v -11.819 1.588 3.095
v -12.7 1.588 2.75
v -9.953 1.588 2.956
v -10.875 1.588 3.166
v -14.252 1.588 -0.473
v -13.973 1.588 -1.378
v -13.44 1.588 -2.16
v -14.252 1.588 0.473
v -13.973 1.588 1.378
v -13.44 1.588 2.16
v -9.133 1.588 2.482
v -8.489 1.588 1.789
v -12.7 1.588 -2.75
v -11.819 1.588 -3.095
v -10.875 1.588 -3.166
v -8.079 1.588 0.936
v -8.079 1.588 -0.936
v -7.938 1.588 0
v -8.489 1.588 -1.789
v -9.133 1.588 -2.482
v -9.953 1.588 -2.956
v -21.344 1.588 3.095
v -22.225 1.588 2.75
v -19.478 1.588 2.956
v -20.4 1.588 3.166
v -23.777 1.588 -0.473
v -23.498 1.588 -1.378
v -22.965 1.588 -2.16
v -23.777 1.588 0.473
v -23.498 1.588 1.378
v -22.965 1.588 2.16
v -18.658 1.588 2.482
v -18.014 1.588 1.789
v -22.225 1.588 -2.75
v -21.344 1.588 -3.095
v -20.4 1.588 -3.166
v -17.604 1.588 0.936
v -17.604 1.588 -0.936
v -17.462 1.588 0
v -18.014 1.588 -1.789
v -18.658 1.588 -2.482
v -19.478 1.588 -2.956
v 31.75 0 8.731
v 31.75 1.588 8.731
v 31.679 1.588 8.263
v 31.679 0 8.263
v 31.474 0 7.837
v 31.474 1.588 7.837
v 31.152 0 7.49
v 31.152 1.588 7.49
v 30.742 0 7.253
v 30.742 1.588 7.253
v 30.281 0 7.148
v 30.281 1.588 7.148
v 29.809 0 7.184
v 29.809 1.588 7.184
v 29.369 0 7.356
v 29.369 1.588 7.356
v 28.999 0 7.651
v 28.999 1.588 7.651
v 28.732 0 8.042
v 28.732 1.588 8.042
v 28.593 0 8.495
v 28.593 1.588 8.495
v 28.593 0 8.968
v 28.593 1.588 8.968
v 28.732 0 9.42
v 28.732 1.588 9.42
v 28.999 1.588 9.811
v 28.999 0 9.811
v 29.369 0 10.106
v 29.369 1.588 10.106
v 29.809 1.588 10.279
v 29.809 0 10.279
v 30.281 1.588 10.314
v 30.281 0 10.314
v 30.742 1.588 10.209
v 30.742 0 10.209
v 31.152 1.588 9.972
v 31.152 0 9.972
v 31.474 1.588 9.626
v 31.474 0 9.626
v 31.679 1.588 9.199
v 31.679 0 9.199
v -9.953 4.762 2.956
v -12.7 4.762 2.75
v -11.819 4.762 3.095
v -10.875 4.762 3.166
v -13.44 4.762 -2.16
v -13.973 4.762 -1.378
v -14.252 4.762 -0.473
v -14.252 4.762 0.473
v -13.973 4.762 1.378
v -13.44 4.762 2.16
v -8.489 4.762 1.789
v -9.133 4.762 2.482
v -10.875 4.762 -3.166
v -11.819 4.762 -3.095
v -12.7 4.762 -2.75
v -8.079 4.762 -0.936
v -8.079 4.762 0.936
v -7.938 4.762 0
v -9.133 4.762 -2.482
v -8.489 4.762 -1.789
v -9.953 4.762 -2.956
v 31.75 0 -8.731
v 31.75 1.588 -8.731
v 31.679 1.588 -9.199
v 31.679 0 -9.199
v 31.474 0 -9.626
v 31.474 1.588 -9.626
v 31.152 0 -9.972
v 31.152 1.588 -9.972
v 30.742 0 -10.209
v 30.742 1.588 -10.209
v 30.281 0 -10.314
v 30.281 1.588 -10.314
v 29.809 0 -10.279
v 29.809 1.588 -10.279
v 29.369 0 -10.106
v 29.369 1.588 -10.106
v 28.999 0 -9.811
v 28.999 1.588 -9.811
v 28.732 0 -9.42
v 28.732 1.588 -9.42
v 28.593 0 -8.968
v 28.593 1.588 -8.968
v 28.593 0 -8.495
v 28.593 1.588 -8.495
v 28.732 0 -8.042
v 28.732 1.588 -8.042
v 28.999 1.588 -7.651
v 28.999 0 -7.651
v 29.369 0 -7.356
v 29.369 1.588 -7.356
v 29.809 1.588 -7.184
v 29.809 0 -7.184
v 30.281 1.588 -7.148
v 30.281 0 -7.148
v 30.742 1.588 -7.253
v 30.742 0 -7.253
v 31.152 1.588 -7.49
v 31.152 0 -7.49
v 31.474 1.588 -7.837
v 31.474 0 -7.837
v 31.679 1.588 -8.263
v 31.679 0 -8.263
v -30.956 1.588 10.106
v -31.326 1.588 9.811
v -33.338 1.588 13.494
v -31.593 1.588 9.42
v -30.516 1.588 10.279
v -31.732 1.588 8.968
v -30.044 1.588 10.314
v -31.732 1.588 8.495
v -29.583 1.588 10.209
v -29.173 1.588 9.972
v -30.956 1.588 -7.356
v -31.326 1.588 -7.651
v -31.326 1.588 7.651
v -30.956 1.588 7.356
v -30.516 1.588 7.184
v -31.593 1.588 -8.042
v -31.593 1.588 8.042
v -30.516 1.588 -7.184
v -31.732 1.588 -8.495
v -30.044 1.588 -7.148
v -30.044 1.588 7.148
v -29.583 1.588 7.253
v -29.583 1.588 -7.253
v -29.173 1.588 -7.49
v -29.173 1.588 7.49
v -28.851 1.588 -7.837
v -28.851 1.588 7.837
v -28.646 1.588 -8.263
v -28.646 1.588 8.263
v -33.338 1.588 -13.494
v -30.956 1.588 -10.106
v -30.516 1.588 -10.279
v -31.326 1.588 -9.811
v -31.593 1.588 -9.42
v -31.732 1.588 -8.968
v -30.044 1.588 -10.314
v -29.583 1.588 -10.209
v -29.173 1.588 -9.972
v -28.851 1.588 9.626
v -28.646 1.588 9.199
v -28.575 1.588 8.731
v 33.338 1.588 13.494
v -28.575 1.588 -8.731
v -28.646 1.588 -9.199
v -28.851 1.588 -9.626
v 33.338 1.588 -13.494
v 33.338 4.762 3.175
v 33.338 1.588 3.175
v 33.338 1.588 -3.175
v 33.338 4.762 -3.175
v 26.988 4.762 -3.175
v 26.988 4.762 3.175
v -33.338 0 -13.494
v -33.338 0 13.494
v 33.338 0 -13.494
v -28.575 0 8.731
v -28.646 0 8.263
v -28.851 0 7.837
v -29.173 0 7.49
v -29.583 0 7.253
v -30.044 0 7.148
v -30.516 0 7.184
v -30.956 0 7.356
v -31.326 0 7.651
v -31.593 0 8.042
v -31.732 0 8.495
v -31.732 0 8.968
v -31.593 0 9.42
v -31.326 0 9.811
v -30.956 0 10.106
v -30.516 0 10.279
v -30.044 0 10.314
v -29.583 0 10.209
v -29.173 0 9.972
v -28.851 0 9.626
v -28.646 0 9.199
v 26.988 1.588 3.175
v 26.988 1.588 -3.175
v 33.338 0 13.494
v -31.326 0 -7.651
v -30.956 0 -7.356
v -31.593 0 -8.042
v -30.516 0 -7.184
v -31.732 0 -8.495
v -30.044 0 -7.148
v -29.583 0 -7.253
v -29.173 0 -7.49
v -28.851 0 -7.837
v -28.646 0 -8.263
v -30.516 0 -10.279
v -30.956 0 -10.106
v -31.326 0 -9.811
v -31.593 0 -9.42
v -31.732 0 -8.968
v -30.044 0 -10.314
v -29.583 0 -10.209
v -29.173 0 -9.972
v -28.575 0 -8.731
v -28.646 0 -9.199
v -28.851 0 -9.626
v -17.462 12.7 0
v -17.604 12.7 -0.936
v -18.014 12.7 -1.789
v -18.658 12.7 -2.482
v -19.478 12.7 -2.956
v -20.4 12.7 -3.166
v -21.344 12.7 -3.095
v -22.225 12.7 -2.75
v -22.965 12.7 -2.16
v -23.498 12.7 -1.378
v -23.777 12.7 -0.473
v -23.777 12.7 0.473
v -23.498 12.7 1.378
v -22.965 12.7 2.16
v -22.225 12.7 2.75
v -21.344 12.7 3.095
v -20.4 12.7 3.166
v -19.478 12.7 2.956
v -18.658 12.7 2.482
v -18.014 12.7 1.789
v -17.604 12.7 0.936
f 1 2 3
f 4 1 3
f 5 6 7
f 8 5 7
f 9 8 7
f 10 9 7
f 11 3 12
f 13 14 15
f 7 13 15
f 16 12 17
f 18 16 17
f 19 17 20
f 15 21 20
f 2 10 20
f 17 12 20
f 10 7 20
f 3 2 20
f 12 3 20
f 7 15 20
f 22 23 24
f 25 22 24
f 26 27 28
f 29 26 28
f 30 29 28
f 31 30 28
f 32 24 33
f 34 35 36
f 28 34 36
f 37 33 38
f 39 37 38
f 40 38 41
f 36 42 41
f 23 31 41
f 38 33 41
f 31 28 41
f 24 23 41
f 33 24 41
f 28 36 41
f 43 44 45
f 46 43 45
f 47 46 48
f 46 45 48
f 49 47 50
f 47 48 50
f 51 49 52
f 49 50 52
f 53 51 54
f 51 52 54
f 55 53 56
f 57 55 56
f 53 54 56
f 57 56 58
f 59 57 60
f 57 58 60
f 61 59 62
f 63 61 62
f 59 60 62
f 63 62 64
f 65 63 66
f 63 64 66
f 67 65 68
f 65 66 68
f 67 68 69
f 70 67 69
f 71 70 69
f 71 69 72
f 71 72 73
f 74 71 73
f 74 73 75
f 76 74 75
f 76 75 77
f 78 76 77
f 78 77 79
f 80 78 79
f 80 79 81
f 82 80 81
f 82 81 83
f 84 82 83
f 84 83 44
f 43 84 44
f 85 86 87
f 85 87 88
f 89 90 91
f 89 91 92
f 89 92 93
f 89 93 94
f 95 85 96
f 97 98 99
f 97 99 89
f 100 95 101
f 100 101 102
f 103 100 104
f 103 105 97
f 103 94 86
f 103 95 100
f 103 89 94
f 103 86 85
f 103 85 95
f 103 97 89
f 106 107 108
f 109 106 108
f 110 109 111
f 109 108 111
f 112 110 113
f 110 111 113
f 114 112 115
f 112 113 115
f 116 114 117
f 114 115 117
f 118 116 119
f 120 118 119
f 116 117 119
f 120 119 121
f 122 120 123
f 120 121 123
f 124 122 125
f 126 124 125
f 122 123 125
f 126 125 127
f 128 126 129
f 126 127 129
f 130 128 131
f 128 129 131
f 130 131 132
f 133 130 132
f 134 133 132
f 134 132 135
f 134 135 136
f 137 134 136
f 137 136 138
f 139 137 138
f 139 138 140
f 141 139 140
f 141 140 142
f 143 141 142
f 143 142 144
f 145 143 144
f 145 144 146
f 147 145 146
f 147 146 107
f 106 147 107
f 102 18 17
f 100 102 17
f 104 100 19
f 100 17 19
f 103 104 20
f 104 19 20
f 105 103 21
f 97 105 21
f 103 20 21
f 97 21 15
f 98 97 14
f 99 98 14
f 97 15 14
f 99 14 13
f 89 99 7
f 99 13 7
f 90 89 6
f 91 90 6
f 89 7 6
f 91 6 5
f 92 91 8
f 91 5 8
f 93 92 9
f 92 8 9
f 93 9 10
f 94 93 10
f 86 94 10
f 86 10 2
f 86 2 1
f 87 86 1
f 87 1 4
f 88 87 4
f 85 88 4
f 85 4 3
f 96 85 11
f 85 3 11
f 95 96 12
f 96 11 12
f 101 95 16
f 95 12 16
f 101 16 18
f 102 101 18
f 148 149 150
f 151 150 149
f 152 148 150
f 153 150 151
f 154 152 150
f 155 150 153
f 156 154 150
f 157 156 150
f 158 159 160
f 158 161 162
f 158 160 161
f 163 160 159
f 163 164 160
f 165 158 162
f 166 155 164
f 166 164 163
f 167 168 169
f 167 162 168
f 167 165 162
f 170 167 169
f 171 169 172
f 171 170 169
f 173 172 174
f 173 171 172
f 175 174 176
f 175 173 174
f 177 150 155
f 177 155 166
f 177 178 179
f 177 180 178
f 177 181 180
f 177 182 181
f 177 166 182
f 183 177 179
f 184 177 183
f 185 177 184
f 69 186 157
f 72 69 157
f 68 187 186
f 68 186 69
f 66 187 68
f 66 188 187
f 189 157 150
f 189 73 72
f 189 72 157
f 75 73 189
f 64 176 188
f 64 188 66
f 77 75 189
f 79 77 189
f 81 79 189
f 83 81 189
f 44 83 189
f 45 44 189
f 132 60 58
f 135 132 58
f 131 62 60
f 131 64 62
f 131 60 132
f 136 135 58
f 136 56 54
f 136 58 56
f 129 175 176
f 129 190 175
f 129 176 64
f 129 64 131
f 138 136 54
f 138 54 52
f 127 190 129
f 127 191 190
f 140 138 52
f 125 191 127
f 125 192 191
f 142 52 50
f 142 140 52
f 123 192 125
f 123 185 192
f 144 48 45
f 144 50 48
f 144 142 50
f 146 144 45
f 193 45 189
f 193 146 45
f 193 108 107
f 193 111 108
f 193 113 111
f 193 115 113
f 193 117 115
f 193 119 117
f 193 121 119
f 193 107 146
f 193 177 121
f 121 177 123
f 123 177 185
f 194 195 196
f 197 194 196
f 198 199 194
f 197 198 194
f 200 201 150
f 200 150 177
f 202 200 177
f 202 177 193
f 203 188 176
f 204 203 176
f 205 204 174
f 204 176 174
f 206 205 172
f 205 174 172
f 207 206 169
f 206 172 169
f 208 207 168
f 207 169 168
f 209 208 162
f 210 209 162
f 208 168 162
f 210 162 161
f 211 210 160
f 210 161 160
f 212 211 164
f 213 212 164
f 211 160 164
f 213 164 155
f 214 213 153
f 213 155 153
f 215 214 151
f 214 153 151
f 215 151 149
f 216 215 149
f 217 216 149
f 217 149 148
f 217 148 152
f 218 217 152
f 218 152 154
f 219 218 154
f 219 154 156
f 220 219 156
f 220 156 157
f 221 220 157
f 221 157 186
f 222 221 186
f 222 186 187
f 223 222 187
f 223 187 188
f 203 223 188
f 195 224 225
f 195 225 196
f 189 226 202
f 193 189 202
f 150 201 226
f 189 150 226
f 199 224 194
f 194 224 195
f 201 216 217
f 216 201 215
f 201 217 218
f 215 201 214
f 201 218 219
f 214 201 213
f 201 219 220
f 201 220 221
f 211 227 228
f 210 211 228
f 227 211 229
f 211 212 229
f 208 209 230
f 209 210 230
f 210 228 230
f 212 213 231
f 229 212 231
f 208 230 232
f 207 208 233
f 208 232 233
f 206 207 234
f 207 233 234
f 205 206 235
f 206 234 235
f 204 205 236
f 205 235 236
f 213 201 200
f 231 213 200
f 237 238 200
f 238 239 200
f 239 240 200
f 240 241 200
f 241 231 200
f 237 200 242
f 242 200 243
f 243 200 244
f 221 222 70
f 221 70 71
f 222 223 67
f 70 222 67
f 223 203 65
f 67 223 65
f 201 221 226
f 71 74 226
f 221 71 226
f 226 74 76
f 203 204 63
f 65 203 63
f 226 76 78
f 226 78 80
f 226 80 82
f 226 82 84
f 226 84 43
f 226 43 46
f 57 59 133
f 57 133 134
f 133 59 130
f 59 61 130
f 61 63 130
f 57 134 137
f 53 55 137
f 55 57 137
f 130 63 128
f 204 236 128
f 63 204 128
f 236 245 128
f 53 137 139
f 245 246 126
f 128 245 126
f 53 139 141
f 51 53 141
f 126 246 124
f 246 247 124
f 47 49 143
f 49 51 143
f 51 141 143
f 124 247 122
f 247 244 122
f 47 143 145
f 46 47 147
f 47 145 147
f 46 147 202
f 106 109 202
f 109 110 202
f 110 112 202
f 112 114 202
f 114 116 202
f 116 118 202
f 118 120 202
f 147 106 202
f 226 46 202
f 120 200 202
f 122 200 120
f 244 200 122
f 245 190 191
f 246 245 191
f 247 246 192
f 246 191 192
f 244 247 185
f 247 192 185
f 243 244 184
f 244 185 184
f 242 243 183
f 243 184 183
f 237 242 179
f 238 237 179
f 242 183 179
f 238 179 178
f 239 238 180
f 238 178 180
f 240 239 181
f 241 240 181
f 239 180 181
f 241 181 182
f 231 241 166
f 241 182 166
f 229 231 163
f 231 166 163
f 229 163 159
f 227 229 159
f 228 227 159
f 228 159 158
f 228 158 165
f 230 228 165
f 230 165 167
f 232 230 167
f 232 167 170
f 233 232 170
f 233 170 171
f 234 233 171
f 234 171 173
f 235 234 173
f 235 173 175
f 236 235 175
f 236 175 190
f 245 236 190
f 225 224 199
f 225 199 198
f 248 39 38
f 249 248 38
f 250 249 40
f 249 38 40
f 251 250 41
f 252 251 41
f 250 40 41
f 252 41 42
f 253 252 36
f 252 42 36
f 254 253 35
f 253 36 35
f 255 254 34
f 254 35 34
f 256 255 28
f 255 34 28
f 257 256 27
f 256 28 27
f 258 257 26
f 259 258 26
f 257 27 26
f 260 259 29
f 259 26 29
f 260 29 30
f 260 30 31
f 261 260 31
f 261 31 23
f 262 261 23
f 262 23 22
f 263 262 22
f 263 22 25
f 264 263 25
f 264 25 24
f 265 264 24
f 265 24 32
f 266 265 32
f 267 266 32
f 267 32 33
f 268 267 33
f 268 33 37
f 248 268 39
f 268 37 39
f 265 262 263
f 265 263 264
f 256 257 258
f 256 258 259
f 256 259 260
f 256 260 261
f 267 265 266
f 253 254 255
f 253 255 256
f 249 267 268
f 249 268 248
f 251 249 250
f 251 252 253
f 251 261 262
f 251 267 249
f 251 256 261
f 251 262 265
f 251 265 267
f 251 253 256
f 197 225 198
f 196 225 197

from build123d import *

# Parameters (mm, degrees)
SKETCH1_W             = 66.675
SKETCH1_H             = 26.9875
BOSS_EXTRUDE1_DEPTH   = 1.5875
SKETCH2_R             = 3.175
BOSS_EXTRUDE2_DEPTH   = 11.1125
SKETCH3_R             = 3.175
BOSS_EXTRUDE3_DEPTH   = 3.175
SKETCH3_W             = 6.35
SKETCH3_H             = 6.35
BOSS_EXTRUDE3_2_DEPTH = 3.175
SKETCH4_R             = 1.5875
CUT_EXTRUDE1_DEPTH    = 2.5875


with BuildPart() as part:
    # Sketch1 → Boss-Extrude1 (new body)
    with BuildSketch(Plane(origin=(0, 0, 0), x_dir=(1, 0, 0), z_dir=(0, 1, 0))):
        Rectangle(SKETCH1_W, SKETCH1_H)
    extrude(amount=BOSS_EXTRUDE1_DEPTH)

    # Sketch4 → Cut-Extrude1 (cut, through all)
    with BuildSketch(Plane(origin=(0, 1.5875, 0), x_dir=(1, 0, 0), z_dir=(0, 1, 0))):
        with Locations((30.1625, -8.73125)):
            Circle(SKETCH4_R)
        with Locations((30.1625, 8.73125)):
            Circle(SKETCH4_R)
        with Locations((-30.1625, 8.73125)):
            Circle(SKETCH4_R)
        with Locations((-30.1625, -8.73125)):
            Circle(SKETCH4_R)
    extrude(amount=-CUT_EXTRUDE1_DEPTH, mode=Mode.SUBTRACT)


with BuildPart() as body_2:
    # Sketch2 → Boss-Extrude2 (new body)
    with BuildSketch(Plane(origin=(0, 1.5875, 0), x_dir=(1, 0, 0), z_dir=(0, 1, 0))):
        with Locations((-20.6375, 0)):
            Circle(SKETCH2_R)
    extrude(amount=BOSS_EXTRUDE2_DEPTH)


with BuildPart() as body_3:
    # Sketch3 → Boss-Extrude3 (new body)
    with BuildSketch(Plane(origin=(0, 1.5875, 0), x_dir=(1, 0, 0), z_dir=(0, 1, 0))):
        with Locations((-11.1125, 0)):
            Circle(SKETCH3_R)
    extrude(amount=BOSS_EXTRUDE3_DEPTH)


with BuildPart() as body_4:
    # Sketch3 → Boss-Extrude3 2 (new body)
    with BuildSketch(Plane(origin=(0, 1.5875, 0), x_dir=(1, 0, 0), z_dir=(0, 1, 0))):
        with Locations((30.1625, 0)):
            Rectangle(SKETCH3_W, SKETCH3_H)
    extrude(amount=BOSS_EXTRUDE3_2_DEPTH)


solid = Compound([part.part, body_2.part, body_3.part, body_4.part])
